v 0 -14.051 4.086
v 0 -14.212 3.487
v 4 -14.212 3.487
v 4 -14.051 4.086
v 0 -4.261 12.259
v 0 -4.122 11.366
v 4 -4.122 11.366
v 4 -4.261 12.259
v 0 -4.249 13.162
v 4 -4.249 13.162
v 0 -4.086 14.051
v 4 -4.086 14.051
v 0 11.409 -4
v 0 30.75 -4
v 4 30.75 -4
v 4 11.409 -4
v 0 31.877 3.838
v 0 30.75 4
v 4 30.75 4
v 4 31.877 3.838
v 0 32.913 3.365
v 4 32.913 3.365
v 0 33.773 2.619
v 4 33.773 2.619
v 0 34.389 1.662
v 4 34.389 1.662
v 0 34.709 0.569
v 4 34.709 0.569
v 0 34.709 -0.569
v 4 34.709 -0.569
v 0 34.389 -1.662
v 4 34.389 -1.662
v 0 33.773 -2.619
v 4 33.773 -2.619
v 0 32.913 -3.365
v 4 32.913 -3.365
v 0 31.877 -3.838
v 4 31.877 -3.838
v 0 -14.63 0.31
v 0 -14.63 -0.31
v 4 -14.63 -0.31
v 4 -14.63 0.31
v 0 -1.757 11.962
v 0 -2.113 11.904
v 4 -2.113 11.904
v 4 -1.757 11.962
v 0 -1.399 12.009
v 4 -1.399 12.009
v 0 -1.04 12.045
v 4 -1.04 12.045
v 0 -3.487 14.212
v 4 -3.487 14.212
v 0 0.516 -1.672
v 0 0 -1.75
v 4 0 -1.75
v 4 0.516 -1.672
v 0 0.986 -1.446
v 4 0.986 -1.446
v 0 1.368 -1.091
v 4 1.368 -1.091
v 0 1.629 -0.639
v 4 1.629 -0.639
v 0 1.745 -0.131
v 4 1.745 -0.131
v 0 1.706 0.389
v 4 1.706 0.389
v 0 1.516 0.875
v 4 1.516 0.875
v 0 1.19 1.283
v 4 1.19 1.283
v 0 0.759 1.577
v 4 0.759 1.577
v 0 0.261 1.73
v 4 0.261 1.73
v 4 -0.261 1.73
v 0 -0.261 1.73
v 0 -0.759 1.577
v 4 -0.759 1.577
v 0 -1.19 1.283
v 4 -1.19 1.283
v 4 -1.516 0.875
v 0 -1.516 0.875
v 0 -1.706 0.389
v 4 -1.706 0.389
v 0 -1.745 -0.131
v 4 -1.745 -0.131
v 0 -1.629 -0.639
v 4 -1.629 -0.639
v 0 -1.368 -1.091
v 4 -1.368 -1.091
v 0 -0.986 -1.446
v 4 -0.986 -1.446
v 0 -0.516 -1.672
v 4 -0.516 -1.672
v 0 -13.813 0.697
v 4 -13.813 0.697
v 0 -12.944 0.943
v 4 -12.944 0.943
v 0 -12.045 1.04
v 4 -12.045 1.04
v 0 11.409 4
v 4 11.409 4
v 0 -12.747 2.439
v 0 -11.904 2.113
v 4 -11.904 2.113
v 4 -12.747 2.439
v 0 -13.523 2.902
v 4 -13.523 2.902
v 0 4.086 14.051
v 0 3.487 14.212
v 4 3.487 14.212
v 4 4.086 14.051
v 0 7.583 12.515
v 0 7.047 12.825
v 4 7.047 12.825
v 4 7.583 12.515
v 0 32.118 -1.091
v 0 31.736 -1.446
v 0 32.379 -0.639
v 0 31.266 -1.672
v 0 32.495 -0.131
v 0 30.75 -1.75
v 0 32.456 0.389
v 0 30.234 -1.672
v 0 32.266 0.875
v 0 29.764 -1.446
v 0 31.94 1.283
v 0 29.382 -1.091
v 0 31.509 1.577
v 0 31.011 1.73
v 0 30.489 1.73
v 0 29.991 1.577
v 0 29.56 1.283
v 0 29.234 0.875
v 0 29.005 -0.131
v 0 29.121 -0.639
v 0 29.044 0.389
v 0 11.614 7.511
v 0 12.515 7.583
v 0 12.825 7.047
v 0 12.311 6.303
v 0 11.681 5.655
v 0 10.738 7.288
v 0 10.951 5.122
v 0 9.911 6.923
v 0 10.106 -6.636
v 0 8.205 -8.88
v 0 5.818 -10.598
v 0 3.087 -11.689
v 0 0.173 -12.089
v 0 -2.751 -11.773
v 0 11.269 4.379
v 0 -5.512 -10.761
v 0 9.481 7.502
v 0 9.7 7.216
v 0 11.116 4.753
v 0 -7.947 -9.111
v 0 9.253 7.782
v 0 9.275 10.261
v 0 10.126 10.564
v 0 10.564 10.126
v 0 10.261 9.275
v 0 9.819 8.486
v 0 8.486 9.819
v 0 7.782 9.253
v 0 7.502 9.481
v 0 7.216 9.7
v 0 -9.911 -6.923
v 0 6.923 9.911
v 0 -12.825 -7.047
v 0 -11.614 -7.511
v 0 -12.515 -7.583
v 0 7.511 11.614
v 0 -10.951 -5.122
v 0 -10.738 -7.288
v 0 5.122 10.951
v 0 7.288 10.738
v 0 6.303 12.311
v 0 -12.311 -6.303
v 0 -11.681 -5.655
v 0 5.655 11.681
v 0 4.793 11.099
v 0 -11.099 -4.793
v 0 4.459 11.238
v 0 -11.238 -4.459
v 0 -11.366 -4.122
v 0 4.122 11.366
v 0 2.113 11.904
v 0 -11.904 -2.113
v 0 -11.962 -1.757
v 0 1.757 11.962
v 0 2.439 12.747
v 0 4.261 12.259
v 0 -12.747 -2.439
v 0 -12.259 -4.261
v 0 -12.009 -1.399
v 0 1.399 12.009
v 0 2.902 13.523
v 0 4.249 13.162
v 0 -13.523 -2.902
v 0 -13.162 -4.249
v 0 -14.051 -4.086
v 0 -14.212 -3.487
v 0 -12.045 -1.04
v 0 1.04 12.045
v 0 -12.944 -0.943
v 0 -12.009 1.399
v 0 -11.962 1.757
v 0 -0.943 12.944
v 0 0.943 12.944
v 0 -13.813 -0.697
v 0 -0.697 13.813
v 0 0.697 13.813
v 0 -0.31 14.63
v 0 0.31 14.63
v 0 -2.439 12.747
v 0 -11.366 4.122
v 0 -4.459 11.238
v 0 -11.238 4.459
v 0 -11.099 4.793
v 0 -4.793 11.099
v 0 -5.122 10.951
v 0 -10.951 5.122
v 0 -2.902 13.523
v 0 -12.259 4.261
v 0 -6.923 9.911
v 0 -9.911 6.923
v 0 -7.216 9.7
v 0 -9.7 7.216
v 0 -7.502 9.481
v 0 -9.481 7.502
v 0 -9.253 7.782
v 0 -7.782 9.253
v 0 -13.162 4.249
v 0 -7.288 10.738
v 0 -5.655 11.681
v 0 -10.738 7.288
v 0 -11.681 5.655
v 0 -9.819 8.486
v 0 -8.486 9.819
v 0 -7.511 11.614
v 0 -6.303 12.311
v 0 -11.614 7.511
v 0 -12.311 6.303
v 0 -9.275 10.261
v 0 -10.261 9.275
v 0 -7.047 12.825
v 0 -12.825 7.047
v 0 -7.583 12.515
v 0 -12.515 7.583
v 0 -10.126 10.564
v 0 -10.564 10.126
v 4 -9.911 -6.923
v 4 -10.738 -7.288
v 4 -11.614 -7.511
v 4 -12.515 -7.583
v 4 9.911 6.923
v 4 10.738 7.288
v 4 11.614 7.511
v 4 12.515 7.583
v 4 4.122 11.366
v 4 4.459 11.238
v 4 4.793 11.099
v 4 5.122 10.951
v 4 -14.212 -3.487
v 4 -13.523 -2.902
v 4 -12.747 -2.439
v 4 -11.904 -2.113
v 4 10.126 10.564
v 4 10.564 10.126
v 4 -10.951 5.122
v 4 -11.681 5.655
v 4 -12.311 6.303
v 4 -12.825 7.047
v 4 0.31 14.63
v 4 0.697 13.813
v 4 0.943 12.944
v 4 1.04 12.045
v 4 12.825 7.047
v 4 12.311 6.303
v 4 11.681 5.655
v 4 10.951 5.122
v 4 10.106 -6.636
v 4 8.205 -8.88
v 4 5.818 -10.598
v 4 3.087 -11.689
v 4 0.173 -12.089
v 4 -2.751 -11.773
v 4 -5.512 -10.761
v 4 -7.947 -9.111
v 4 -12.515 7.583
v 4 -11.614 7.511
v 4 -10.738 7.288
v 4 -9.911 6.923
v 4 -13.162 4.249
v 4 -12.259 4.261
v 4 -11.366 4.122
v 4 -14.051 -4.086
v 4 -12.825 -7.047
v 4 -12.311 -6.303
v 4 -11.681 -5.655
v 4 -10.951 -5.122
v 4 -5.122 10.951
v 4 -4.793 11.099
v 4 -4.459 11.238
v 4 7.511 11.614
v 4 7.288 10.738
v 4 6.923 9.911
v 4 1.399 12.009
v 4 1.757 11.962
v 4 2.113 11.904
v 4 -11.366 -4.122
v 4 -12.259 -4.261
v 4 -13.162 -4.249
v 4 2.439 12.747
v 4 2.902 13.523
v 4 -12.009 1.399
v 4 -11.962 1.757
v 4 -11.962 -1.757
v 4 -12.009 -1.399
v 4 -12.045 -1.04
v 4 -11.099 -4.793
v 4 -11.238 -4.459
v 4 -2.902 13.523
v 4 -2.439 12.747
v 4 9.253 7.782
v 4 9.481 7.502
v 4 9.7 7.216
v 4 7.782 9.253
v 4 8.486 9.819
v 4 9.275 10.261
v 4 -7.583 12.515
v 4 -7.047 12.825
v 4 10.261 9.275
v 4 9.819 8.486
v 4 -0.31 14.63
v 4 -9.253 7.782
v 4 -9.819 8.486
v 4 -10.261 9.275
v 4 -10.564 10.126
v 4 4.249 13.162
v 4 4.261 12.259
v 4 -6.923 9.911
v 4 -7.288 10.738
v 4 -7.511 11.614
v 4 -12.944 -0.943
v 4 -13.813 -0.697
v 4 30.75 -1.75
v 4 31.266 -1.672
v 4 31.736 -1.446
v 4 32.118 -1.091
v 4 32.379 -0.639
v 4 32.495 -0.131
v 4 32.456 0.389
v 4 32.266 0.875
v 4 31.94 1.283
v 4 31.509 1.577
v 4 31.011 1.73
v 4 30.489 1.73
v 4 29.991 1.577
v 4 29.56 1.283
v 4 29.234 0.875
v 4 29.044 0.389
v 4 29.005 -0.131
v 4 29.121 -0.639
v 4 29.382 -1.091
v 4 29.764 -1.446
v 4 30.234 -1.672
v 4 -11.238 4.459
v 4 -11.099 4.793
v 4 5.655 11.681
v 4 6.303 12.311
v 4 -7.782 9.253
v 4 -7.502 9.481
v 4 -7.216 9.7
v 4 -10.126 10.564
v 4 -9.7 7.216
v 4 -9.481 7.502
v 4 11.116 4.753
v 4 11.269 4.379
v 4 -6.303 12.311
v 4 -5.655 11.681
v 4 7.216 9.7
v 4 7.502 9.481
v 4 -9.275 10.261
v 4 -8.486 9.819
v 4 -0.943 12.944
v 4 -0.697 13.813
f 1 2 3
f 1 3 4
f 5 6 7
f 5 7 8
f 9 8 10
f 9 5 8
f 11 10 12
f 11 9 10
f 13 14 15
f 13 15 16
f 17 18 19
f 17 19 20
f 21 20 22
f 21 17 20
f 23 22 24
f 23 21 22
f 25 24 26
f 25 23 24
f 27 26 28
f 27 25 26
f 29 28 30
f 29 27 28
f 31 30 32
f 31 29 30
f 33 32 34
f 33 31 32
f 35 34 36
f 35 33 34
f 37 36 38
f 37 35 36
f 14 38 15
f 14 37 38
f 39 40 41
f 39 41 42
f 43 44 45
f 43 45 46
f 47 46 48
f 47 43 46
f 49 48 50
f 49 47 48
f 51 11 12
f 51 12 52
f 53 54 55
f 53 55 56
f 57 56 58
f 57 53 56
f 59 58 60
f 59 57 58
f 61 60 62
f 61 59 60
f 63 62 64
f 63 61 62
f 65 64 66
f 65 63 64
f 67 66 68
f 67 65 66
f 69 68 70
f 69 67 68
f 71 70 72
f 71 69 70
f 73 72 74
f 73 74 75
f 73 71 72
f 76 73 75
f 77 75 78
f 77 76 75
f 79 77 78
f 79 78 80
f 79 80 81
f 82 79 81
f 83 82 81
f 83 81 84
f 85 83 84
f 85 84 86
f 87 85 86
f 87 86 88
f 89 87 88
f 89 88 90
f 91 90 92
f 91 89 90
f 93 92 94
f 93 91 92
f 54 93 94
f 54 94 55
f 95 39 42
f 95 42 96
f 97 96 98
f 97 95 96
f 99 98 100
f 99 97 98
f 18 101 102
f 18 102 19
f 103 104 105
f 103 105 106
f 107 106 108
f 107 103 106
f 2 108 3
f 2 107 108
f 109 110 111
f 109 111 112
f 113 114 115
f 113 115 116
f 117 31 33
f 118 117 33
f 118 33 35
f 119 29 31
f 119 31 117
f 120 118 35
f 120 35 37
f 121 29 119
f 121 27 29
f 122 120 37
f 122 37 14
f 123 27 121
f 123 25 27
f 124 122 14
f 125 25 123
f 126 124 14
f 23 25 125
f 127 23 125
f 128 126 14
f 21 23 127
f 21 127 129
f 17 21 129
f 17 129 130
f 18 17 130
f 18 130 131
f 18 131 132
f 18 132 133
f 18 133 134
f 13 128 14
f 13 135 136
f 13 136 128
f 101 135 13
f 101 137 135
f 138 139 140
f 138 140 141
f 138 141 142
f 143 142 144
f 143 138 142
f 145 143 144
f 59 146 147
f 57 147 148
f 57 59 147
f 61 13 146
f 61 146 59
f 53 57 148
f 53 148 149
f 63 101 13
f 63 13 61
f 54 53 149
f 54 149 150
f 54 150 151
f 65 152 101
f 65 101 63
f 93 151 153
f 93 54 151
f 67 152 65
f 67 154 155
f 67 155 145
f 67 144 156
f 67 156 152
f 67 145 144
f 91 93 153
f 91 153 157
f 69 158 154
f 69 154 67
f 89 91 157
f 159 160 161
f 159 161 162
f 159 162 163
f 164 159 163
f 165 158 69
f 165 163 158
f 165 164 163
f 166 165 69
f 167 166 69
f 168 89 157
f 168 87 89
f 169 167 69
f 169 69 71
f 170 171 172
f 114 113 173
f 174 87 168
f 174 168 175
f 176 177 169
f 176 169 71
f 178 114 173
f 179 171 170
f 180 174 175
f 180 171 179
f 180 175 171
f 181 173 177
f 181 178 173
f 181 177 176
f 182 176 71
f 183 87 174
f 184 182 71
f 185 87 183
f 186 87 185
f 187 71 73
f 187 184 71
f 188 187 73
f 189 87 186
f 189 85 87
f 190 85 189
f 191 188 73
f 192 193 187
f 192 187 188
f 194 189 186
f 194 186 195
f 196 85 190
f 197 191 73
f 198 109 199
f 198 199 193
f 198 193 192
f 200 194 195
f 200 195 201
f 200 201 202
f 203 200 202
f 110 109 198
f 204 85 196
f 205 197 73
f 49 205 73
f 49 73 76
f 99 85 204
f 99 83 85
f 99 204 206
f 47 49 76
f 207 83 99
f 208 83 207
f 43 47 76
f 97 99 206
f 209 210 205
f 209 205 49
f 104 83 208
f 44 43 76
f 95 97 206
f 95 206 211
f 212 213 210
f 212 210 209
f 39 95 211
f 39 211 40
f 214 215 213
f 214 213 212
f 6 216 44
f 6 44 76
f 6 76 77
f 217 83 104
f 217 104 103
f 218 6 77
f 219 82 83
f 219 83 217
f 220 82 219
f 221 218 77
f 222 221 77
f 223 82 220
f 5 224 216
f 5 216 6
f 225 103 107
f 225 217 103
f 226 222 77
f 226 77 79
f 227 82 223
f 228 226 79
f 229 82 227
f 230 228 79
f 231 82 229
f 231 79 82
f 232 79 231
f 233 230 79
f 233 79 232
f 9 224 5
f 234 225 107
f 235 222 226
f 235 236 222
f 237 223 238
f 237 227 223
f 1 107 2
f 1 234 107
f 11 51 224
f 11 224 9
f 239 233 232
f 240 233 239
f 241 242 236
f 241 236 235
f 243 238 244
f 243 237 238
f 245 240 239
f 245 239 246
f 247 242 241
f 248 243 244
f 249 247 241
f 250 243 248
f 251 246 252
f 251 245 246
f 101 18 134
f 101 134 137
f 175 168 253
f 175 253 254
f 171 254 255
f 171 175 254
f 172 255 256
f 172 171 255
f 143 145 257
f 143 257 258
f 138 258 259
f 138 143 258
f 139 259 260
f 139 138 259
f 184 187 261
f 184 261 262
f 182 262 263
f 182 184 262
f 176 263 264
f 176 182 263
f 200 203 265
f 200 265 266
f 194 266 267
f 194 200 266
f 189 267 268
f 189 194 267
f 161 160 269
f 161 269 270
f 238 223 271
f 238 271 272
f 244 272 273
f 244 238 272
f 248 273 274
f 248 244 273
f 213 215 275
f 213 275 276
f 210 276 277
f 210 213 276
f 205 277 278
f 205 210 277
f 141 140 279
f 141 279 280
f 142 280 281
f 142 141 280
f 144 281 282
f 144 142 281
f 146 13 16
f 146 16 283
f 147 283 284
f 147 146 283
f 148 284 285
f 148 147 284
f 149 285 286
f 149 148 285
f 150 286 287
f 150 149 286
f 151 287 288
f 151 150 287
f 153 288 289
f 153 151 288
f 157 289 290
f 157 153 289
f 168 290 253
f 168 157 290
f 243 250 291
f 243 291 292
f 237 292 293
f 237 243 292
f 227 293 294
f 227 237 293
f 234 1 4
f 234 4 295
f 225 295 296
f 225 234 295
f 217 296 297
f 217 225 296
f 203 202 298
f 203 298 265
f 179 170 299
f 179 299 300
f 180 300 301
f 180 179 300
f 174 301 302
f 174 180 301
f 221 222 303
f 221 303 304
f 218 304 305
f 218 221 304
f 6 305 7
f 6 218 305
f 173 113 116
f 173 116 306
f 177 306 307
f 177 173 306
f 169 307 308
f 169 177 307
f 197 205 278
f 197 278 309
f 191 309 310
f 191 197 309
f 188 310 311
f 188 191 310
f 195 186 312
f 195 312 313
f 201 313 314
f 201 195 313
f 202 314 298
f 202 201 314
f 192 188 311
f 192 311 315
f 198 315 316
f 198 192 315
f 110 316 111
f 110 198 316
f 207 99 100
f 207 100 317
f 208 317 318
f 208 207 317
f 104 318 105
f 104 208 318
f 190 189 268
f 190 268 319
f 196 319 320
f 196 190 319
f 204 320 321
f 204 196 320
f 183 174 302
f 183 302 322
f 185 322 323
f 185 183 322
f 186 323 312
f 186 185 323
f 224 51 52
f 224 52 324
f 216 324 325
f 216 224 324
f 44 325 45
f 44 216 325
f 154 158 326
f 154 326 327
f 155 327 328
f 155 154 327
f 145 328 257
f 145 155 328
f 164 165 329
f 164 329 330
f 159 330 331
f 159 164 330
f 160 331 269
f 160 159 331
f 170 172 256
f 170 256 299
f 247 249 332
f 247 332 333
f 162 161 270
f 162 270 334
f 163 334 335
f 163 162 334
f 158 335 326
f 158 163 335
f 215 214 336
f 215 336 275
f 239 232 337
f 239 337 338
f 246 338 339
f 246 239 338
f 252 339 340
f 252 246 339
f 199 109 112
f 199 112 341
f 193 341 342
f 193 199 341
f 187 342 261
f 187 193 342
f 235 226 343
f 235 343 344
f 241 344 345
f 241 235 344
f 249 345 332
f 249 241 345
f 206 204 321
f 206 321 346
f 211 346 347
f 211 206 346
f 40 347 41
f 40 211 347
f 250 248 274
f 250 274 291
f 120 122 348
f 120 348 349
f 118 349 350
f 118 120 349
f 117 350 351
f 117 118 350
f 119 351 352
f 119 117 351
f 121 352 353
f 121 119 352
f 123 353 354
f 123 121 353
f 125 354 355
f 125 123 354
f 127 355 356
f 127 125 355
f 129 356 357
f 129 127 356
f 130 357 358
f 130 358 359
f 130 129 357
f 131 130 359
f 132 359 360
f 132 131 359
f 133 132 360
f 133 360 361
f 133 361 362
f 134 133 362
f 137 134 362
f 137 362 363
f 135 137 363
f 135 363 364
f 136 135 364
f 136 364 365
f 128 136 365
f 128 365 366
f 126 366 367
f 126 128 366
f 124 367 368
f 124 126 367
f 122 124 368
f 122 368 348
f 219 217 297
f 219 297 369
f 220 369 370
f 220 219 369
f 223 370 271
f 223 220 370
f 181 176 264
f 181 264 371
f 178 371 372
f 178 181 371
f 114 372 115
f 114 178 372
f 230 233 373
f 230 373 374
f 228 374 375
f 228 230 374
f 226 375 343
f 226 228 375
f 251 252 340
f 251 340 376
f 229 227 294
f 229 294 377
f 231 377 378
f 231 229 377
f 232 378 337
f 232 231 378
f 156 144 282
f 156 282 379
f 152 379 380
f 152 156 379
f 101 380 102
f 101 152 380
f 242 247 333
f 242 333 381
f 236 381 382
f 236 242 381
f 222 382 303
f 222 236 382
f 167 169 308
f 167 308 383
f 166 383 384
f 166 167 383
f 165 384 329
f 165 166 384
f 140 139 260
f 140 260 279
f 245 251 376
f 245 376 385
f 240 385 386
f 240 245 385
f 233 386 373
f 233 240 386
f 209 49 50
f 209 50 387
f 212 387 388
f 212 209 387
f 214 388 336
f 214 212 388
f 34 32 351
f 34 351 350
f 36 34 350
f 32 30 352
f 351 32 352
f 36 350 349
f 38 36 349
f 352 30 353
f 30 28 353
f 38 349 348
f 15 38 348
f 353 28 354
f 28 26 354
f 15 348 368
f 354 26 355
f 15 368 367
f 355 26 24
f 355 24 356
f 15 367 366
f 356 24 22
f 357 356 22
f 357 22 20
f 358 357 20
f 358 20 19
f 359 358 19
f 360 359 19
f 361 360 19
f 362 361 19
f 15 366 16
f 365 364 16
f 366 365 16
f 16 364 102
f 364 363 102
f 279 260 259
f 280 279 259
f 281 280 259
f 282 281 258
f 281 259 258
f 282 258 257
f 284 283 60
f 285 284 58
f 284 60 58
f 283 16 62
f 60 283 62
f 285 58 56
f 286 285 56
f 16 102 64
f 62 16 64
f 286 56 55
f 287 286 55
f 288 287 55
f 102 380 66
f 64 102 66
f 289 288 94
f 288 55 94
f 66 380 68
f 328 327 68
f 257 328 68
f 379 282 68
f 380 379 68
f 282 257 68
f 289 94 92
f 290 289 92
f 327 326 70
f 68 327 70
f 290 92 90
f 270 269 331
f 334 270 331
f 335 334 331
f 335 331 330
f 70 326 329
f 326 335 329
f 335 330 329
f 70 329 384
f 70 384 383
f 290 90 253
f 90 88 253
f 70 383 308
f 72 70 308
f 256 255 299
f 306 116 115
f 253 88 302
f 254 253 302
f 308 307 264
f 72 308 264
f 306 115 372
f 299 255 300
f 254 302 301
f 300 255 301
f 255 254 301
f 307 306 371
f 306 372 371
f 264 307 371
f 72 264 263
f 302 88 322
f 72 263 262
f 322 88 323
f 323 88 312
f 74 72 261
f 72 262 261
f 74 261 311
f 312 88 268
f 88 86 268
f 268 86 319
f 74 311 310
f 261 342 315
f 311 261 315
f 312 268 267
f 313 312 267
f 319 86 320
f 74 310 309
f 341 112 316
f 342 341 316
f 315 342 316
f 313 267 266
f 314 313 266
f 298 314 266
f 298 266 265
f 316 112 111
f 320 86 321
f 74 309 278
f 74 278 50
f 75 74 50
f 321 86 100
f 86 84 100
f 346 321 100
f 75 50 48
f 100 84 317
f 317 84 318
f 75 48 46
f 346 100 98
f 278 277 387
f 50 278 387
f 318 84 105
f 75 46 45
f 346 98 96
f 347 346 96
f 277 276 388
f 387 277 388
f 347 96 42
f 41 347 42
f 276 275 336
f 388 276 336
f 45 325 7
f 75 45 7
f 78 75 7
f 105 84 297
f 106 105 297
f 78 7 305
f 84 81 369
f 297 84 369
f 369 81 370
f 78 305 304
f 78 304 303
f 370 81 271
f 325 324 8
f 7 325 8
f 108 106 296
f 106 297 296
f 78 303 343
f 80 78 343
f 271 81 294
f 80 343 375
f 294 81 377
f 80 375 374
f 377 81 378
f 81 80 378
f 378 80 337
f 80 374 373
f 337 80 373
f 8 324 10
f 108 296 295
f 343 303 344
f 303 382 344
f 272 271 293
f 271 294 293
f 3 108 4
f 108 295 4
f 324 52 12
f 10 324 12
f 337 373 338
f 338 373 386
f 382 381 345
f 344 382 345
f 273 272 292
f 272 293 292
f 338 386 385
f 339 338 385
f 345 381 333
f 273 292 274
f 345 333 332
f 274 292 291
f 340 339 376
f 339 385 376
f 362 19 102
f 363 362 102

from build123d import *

# Parameters (mm, degrees)
SKETCH1_R           = 1.75
BOSS_EXTRUDE1_DEPTH = 4


with BuildPart() as part:
    # Sketch1 → Boss-Extrude1 (new body)
    with BuildSketch(Plane.YZ):
        with BuildLine():
            Line((-0.31, 14.63), (0.31, 14.63))
            ThreePointArc((0.31, 14.63), (0.838273314, 13.383704325), (1.04, 12.04518576))
            ThreePointArc((1.04, 12.04518576), (1.578061664, 11.986568374), (2.112960617, 11.903927815))
            ThreePointArc((2.112960617, 11.903927815), (2.65424773, 13.144626757), (3.487085624, 14.211728743))
            Line((3.487085624, 14.211728743), (4.085959636, 14.051260935))
            ThreePointArc((4.085959636, 14.051260935), (4.273667417, 12.71070456), (4.122086336, 11.365584201))
            ThreePointArc((4.122086336, 11.365584201), (4.626642697, 11.169703548), (5.12192646, 10.951436862))
            ThreePointArc((5.12192646, 10.951436862), (5.965886177, 12.009764599), (7.046532125, 12.824951657))
            Line((7.046532125, 12.824951657), (7.583467875, 12.514951657))
            ThreePointArc((7.583467875, 12.514951657), (7.417818147, 11.171491285), (6.9232593, 9.911436862))
            ThreePointArc((6.9232593, 9.911436862), (7.359925677, 9.591641884), (7.781841479, 9.252623584))
            ThreePointArc((7.781841479, 9.252623584), (8.870959341, 10.05645683), (10.125769107, 10.564175311))
            Line((10.125769107, 10.564175311), (10.564175311, 10.125769107))
            ThreePointArc((10.564175311, 10.125769107), (10.05645683, 8.870959341), (9.252623584, 7.781841479))
            ThreePointArc((9.252623584, 7.781841479), (9.591641884, 7.359925677), (9.911436862, 6.9232593))
            ThreePointArc((9.911436862, 6.9232593), (11.171491285, 7.417818147), (12.514951657, 7.583467875))
            Line((12.514951657, 7.583467875), (12.824951657, 7.046532125))
            ThreePointArc((12.824951657, 7.046532125), (12.009764599, 5.965886177), (10.951436862, 5.12192646))
            ThreePointArc((10.951436862, 5.12192646), (11.194344337, 4.566700654), (11.409123542, 4))
            Line((11.409123542, 4), (30.75, 4))
            ThreePointArc((30.75, 4), (34.75, 0), (30.75, -4))
            Line((30.75, -4), (11.409123542, -4))
            ThreePointArc((11.409123542, -4), (1.642293391, -11.977936902), (-9.911436862, -6.9232593))
            ThreePointArc((-9.911436862, -6.9232593), (-11.171491285, -7.417818147), (-12.514951657, -7.583467875))
            Line((-12.514951657, -7.583467875), (-12.824951657, -7.046532125))
            ThreePointArc((-12.824951657, -7.046532125), (-12.009764599, -5.965886177), (-10.951436862, -5.12192646))
            ThreePointArc((-10.951436862, -5.12192646), (-11.169703548, -4.626642697), (-11.365584201, -4.122086336))
            ThreePointArc((-11.365584201, -4.122086336), (-12.71070456, -4.273667417), (-14.051260935, -4.085959636))
            Line((-14.051260935, -4.085959636), (-14.211728743, -3.487085624))
            ThreePointArc((-14.211728743, -3.487085624), (-13.144626757, -2.65424773), (-11.903927815, -2.112960617))
            ThreePointArc((-11.903927815, -2.112960617), (-11.986568374, -1.578061664), (-12.04518576, -1.04))
            ThreePointArc((-12.04518576, -1.04), (-13.383704325, -0.838273314), (-14.63, -0.31))
            Line((-14.63, -0.31), (-14.63, 0.31))
            ThreePointArc((-14.63, 0.31), (-13.383704325, 0.838273314), (-12.04518576, 1.04))
            ThreePointArc((-12.04518576, 1.04), (-11.986568374, 1.578061664), (-11.903927815, 2.112960617))
            ThreePointArc((-11.903927815, 2.112960617), (-13.144626757, 2.65424773), (-14.211728743, 3.487085624))
            Line((-14.211728743, 3.487085624), (-14.051260935, 4.085959636))
            ThreePointArc((-14.051260935, 4.085959636), (-12.71070456, 4.273667417), (-11.365584201, 4.122086336))
            ThreePointArc((-11.365584201, 4.122086336), (-11.169703548, 4.626642697), (-10.951436862, 5.12192646))
            ThreePointArc((-10.951436862, 5.12192646), (-12.009764599, 5.965886177), (-12.824951657, 7.046532125))
            Line((-12.824951657, 7.046532125), (-12.514951657, 7.583467875))
            ThreePointArc((-12.514951657, 7.583467875), (-11.171491285, 7.417818147), (-9.911436862, 6.9232593))
            ThreePointArc((-9.911436862, 6.9232593), (-9.591641884, 7.359925677), (-9.252623584, 7.781841479))
            ThreePointArc((-9.252623584, 7.781841479), (-10.05645683, 8.870959341), (-10.564175311, 10.125769107))
            Line((-10.564175311, 10.125769107), (-10.125769107, 10.564175311))
            ThreePointArc((-10.125769107, 10.564175311), (-8.870959341, 10.05645683), (-7.781841479, 9.252623584))
            ThreePointArc((-7.781841479, 9.252623584), (-7.359925677, 9.591641884), (-6.9232593, 9.911436862))
            ThreePointArc((-6.9232593, 9.911436862), (-7.417818147, 11.171491285), (-7.583467875, 12.514951657))
            Line((-7.583467875, 12.514951657), (-7.046532125, 12.824951657))
            ThreePointArc((-7.046532125, 12.824951657), (-5.965886177, 12.009764599), (-5.12192646, 10.951436862))
            ThreePointArc((-5.12192646, 10.951436862), (-4.626642697, 11.169703548), (-4.122086336, 11.365584201))
            ThreePointArc((-4.122086336, 11.365584201), (-4.273667417, 12.71070456), (-4.085959636, 14.051260935))
            Line((-4.085959636, 14.051260935), (-3.487085624, 14.211728743))
            ThreePointArc((-3.487085624, 14.211728743), (-2.65424773, 13.144626757), (-2.112960617, 11.903927815))
            ThreePointArc((-2.112960617, 11.903927815), (-1.578061664, 11.986568374), (-1.04, 12.04518576))
            ThreePointArc((-1.04, 12.04518576), (-0.838273314, 13.383704325), (-0.31, 14.63))
        make_face()
        with Locations(Location((0, 0, 0), (0, 0, 270))):
            Circle(SKETCH1_R, mode=Mode.SUBTRACT)
        with Locations(Location((30.75, 0, 0), (0, 0, 270))):
            Circle(SKETCH1_R, mode=Mode.SUBTRACT)
    extrude(amount=BOSS_EXTRUDE1_DEPTH)


solid = part.part
